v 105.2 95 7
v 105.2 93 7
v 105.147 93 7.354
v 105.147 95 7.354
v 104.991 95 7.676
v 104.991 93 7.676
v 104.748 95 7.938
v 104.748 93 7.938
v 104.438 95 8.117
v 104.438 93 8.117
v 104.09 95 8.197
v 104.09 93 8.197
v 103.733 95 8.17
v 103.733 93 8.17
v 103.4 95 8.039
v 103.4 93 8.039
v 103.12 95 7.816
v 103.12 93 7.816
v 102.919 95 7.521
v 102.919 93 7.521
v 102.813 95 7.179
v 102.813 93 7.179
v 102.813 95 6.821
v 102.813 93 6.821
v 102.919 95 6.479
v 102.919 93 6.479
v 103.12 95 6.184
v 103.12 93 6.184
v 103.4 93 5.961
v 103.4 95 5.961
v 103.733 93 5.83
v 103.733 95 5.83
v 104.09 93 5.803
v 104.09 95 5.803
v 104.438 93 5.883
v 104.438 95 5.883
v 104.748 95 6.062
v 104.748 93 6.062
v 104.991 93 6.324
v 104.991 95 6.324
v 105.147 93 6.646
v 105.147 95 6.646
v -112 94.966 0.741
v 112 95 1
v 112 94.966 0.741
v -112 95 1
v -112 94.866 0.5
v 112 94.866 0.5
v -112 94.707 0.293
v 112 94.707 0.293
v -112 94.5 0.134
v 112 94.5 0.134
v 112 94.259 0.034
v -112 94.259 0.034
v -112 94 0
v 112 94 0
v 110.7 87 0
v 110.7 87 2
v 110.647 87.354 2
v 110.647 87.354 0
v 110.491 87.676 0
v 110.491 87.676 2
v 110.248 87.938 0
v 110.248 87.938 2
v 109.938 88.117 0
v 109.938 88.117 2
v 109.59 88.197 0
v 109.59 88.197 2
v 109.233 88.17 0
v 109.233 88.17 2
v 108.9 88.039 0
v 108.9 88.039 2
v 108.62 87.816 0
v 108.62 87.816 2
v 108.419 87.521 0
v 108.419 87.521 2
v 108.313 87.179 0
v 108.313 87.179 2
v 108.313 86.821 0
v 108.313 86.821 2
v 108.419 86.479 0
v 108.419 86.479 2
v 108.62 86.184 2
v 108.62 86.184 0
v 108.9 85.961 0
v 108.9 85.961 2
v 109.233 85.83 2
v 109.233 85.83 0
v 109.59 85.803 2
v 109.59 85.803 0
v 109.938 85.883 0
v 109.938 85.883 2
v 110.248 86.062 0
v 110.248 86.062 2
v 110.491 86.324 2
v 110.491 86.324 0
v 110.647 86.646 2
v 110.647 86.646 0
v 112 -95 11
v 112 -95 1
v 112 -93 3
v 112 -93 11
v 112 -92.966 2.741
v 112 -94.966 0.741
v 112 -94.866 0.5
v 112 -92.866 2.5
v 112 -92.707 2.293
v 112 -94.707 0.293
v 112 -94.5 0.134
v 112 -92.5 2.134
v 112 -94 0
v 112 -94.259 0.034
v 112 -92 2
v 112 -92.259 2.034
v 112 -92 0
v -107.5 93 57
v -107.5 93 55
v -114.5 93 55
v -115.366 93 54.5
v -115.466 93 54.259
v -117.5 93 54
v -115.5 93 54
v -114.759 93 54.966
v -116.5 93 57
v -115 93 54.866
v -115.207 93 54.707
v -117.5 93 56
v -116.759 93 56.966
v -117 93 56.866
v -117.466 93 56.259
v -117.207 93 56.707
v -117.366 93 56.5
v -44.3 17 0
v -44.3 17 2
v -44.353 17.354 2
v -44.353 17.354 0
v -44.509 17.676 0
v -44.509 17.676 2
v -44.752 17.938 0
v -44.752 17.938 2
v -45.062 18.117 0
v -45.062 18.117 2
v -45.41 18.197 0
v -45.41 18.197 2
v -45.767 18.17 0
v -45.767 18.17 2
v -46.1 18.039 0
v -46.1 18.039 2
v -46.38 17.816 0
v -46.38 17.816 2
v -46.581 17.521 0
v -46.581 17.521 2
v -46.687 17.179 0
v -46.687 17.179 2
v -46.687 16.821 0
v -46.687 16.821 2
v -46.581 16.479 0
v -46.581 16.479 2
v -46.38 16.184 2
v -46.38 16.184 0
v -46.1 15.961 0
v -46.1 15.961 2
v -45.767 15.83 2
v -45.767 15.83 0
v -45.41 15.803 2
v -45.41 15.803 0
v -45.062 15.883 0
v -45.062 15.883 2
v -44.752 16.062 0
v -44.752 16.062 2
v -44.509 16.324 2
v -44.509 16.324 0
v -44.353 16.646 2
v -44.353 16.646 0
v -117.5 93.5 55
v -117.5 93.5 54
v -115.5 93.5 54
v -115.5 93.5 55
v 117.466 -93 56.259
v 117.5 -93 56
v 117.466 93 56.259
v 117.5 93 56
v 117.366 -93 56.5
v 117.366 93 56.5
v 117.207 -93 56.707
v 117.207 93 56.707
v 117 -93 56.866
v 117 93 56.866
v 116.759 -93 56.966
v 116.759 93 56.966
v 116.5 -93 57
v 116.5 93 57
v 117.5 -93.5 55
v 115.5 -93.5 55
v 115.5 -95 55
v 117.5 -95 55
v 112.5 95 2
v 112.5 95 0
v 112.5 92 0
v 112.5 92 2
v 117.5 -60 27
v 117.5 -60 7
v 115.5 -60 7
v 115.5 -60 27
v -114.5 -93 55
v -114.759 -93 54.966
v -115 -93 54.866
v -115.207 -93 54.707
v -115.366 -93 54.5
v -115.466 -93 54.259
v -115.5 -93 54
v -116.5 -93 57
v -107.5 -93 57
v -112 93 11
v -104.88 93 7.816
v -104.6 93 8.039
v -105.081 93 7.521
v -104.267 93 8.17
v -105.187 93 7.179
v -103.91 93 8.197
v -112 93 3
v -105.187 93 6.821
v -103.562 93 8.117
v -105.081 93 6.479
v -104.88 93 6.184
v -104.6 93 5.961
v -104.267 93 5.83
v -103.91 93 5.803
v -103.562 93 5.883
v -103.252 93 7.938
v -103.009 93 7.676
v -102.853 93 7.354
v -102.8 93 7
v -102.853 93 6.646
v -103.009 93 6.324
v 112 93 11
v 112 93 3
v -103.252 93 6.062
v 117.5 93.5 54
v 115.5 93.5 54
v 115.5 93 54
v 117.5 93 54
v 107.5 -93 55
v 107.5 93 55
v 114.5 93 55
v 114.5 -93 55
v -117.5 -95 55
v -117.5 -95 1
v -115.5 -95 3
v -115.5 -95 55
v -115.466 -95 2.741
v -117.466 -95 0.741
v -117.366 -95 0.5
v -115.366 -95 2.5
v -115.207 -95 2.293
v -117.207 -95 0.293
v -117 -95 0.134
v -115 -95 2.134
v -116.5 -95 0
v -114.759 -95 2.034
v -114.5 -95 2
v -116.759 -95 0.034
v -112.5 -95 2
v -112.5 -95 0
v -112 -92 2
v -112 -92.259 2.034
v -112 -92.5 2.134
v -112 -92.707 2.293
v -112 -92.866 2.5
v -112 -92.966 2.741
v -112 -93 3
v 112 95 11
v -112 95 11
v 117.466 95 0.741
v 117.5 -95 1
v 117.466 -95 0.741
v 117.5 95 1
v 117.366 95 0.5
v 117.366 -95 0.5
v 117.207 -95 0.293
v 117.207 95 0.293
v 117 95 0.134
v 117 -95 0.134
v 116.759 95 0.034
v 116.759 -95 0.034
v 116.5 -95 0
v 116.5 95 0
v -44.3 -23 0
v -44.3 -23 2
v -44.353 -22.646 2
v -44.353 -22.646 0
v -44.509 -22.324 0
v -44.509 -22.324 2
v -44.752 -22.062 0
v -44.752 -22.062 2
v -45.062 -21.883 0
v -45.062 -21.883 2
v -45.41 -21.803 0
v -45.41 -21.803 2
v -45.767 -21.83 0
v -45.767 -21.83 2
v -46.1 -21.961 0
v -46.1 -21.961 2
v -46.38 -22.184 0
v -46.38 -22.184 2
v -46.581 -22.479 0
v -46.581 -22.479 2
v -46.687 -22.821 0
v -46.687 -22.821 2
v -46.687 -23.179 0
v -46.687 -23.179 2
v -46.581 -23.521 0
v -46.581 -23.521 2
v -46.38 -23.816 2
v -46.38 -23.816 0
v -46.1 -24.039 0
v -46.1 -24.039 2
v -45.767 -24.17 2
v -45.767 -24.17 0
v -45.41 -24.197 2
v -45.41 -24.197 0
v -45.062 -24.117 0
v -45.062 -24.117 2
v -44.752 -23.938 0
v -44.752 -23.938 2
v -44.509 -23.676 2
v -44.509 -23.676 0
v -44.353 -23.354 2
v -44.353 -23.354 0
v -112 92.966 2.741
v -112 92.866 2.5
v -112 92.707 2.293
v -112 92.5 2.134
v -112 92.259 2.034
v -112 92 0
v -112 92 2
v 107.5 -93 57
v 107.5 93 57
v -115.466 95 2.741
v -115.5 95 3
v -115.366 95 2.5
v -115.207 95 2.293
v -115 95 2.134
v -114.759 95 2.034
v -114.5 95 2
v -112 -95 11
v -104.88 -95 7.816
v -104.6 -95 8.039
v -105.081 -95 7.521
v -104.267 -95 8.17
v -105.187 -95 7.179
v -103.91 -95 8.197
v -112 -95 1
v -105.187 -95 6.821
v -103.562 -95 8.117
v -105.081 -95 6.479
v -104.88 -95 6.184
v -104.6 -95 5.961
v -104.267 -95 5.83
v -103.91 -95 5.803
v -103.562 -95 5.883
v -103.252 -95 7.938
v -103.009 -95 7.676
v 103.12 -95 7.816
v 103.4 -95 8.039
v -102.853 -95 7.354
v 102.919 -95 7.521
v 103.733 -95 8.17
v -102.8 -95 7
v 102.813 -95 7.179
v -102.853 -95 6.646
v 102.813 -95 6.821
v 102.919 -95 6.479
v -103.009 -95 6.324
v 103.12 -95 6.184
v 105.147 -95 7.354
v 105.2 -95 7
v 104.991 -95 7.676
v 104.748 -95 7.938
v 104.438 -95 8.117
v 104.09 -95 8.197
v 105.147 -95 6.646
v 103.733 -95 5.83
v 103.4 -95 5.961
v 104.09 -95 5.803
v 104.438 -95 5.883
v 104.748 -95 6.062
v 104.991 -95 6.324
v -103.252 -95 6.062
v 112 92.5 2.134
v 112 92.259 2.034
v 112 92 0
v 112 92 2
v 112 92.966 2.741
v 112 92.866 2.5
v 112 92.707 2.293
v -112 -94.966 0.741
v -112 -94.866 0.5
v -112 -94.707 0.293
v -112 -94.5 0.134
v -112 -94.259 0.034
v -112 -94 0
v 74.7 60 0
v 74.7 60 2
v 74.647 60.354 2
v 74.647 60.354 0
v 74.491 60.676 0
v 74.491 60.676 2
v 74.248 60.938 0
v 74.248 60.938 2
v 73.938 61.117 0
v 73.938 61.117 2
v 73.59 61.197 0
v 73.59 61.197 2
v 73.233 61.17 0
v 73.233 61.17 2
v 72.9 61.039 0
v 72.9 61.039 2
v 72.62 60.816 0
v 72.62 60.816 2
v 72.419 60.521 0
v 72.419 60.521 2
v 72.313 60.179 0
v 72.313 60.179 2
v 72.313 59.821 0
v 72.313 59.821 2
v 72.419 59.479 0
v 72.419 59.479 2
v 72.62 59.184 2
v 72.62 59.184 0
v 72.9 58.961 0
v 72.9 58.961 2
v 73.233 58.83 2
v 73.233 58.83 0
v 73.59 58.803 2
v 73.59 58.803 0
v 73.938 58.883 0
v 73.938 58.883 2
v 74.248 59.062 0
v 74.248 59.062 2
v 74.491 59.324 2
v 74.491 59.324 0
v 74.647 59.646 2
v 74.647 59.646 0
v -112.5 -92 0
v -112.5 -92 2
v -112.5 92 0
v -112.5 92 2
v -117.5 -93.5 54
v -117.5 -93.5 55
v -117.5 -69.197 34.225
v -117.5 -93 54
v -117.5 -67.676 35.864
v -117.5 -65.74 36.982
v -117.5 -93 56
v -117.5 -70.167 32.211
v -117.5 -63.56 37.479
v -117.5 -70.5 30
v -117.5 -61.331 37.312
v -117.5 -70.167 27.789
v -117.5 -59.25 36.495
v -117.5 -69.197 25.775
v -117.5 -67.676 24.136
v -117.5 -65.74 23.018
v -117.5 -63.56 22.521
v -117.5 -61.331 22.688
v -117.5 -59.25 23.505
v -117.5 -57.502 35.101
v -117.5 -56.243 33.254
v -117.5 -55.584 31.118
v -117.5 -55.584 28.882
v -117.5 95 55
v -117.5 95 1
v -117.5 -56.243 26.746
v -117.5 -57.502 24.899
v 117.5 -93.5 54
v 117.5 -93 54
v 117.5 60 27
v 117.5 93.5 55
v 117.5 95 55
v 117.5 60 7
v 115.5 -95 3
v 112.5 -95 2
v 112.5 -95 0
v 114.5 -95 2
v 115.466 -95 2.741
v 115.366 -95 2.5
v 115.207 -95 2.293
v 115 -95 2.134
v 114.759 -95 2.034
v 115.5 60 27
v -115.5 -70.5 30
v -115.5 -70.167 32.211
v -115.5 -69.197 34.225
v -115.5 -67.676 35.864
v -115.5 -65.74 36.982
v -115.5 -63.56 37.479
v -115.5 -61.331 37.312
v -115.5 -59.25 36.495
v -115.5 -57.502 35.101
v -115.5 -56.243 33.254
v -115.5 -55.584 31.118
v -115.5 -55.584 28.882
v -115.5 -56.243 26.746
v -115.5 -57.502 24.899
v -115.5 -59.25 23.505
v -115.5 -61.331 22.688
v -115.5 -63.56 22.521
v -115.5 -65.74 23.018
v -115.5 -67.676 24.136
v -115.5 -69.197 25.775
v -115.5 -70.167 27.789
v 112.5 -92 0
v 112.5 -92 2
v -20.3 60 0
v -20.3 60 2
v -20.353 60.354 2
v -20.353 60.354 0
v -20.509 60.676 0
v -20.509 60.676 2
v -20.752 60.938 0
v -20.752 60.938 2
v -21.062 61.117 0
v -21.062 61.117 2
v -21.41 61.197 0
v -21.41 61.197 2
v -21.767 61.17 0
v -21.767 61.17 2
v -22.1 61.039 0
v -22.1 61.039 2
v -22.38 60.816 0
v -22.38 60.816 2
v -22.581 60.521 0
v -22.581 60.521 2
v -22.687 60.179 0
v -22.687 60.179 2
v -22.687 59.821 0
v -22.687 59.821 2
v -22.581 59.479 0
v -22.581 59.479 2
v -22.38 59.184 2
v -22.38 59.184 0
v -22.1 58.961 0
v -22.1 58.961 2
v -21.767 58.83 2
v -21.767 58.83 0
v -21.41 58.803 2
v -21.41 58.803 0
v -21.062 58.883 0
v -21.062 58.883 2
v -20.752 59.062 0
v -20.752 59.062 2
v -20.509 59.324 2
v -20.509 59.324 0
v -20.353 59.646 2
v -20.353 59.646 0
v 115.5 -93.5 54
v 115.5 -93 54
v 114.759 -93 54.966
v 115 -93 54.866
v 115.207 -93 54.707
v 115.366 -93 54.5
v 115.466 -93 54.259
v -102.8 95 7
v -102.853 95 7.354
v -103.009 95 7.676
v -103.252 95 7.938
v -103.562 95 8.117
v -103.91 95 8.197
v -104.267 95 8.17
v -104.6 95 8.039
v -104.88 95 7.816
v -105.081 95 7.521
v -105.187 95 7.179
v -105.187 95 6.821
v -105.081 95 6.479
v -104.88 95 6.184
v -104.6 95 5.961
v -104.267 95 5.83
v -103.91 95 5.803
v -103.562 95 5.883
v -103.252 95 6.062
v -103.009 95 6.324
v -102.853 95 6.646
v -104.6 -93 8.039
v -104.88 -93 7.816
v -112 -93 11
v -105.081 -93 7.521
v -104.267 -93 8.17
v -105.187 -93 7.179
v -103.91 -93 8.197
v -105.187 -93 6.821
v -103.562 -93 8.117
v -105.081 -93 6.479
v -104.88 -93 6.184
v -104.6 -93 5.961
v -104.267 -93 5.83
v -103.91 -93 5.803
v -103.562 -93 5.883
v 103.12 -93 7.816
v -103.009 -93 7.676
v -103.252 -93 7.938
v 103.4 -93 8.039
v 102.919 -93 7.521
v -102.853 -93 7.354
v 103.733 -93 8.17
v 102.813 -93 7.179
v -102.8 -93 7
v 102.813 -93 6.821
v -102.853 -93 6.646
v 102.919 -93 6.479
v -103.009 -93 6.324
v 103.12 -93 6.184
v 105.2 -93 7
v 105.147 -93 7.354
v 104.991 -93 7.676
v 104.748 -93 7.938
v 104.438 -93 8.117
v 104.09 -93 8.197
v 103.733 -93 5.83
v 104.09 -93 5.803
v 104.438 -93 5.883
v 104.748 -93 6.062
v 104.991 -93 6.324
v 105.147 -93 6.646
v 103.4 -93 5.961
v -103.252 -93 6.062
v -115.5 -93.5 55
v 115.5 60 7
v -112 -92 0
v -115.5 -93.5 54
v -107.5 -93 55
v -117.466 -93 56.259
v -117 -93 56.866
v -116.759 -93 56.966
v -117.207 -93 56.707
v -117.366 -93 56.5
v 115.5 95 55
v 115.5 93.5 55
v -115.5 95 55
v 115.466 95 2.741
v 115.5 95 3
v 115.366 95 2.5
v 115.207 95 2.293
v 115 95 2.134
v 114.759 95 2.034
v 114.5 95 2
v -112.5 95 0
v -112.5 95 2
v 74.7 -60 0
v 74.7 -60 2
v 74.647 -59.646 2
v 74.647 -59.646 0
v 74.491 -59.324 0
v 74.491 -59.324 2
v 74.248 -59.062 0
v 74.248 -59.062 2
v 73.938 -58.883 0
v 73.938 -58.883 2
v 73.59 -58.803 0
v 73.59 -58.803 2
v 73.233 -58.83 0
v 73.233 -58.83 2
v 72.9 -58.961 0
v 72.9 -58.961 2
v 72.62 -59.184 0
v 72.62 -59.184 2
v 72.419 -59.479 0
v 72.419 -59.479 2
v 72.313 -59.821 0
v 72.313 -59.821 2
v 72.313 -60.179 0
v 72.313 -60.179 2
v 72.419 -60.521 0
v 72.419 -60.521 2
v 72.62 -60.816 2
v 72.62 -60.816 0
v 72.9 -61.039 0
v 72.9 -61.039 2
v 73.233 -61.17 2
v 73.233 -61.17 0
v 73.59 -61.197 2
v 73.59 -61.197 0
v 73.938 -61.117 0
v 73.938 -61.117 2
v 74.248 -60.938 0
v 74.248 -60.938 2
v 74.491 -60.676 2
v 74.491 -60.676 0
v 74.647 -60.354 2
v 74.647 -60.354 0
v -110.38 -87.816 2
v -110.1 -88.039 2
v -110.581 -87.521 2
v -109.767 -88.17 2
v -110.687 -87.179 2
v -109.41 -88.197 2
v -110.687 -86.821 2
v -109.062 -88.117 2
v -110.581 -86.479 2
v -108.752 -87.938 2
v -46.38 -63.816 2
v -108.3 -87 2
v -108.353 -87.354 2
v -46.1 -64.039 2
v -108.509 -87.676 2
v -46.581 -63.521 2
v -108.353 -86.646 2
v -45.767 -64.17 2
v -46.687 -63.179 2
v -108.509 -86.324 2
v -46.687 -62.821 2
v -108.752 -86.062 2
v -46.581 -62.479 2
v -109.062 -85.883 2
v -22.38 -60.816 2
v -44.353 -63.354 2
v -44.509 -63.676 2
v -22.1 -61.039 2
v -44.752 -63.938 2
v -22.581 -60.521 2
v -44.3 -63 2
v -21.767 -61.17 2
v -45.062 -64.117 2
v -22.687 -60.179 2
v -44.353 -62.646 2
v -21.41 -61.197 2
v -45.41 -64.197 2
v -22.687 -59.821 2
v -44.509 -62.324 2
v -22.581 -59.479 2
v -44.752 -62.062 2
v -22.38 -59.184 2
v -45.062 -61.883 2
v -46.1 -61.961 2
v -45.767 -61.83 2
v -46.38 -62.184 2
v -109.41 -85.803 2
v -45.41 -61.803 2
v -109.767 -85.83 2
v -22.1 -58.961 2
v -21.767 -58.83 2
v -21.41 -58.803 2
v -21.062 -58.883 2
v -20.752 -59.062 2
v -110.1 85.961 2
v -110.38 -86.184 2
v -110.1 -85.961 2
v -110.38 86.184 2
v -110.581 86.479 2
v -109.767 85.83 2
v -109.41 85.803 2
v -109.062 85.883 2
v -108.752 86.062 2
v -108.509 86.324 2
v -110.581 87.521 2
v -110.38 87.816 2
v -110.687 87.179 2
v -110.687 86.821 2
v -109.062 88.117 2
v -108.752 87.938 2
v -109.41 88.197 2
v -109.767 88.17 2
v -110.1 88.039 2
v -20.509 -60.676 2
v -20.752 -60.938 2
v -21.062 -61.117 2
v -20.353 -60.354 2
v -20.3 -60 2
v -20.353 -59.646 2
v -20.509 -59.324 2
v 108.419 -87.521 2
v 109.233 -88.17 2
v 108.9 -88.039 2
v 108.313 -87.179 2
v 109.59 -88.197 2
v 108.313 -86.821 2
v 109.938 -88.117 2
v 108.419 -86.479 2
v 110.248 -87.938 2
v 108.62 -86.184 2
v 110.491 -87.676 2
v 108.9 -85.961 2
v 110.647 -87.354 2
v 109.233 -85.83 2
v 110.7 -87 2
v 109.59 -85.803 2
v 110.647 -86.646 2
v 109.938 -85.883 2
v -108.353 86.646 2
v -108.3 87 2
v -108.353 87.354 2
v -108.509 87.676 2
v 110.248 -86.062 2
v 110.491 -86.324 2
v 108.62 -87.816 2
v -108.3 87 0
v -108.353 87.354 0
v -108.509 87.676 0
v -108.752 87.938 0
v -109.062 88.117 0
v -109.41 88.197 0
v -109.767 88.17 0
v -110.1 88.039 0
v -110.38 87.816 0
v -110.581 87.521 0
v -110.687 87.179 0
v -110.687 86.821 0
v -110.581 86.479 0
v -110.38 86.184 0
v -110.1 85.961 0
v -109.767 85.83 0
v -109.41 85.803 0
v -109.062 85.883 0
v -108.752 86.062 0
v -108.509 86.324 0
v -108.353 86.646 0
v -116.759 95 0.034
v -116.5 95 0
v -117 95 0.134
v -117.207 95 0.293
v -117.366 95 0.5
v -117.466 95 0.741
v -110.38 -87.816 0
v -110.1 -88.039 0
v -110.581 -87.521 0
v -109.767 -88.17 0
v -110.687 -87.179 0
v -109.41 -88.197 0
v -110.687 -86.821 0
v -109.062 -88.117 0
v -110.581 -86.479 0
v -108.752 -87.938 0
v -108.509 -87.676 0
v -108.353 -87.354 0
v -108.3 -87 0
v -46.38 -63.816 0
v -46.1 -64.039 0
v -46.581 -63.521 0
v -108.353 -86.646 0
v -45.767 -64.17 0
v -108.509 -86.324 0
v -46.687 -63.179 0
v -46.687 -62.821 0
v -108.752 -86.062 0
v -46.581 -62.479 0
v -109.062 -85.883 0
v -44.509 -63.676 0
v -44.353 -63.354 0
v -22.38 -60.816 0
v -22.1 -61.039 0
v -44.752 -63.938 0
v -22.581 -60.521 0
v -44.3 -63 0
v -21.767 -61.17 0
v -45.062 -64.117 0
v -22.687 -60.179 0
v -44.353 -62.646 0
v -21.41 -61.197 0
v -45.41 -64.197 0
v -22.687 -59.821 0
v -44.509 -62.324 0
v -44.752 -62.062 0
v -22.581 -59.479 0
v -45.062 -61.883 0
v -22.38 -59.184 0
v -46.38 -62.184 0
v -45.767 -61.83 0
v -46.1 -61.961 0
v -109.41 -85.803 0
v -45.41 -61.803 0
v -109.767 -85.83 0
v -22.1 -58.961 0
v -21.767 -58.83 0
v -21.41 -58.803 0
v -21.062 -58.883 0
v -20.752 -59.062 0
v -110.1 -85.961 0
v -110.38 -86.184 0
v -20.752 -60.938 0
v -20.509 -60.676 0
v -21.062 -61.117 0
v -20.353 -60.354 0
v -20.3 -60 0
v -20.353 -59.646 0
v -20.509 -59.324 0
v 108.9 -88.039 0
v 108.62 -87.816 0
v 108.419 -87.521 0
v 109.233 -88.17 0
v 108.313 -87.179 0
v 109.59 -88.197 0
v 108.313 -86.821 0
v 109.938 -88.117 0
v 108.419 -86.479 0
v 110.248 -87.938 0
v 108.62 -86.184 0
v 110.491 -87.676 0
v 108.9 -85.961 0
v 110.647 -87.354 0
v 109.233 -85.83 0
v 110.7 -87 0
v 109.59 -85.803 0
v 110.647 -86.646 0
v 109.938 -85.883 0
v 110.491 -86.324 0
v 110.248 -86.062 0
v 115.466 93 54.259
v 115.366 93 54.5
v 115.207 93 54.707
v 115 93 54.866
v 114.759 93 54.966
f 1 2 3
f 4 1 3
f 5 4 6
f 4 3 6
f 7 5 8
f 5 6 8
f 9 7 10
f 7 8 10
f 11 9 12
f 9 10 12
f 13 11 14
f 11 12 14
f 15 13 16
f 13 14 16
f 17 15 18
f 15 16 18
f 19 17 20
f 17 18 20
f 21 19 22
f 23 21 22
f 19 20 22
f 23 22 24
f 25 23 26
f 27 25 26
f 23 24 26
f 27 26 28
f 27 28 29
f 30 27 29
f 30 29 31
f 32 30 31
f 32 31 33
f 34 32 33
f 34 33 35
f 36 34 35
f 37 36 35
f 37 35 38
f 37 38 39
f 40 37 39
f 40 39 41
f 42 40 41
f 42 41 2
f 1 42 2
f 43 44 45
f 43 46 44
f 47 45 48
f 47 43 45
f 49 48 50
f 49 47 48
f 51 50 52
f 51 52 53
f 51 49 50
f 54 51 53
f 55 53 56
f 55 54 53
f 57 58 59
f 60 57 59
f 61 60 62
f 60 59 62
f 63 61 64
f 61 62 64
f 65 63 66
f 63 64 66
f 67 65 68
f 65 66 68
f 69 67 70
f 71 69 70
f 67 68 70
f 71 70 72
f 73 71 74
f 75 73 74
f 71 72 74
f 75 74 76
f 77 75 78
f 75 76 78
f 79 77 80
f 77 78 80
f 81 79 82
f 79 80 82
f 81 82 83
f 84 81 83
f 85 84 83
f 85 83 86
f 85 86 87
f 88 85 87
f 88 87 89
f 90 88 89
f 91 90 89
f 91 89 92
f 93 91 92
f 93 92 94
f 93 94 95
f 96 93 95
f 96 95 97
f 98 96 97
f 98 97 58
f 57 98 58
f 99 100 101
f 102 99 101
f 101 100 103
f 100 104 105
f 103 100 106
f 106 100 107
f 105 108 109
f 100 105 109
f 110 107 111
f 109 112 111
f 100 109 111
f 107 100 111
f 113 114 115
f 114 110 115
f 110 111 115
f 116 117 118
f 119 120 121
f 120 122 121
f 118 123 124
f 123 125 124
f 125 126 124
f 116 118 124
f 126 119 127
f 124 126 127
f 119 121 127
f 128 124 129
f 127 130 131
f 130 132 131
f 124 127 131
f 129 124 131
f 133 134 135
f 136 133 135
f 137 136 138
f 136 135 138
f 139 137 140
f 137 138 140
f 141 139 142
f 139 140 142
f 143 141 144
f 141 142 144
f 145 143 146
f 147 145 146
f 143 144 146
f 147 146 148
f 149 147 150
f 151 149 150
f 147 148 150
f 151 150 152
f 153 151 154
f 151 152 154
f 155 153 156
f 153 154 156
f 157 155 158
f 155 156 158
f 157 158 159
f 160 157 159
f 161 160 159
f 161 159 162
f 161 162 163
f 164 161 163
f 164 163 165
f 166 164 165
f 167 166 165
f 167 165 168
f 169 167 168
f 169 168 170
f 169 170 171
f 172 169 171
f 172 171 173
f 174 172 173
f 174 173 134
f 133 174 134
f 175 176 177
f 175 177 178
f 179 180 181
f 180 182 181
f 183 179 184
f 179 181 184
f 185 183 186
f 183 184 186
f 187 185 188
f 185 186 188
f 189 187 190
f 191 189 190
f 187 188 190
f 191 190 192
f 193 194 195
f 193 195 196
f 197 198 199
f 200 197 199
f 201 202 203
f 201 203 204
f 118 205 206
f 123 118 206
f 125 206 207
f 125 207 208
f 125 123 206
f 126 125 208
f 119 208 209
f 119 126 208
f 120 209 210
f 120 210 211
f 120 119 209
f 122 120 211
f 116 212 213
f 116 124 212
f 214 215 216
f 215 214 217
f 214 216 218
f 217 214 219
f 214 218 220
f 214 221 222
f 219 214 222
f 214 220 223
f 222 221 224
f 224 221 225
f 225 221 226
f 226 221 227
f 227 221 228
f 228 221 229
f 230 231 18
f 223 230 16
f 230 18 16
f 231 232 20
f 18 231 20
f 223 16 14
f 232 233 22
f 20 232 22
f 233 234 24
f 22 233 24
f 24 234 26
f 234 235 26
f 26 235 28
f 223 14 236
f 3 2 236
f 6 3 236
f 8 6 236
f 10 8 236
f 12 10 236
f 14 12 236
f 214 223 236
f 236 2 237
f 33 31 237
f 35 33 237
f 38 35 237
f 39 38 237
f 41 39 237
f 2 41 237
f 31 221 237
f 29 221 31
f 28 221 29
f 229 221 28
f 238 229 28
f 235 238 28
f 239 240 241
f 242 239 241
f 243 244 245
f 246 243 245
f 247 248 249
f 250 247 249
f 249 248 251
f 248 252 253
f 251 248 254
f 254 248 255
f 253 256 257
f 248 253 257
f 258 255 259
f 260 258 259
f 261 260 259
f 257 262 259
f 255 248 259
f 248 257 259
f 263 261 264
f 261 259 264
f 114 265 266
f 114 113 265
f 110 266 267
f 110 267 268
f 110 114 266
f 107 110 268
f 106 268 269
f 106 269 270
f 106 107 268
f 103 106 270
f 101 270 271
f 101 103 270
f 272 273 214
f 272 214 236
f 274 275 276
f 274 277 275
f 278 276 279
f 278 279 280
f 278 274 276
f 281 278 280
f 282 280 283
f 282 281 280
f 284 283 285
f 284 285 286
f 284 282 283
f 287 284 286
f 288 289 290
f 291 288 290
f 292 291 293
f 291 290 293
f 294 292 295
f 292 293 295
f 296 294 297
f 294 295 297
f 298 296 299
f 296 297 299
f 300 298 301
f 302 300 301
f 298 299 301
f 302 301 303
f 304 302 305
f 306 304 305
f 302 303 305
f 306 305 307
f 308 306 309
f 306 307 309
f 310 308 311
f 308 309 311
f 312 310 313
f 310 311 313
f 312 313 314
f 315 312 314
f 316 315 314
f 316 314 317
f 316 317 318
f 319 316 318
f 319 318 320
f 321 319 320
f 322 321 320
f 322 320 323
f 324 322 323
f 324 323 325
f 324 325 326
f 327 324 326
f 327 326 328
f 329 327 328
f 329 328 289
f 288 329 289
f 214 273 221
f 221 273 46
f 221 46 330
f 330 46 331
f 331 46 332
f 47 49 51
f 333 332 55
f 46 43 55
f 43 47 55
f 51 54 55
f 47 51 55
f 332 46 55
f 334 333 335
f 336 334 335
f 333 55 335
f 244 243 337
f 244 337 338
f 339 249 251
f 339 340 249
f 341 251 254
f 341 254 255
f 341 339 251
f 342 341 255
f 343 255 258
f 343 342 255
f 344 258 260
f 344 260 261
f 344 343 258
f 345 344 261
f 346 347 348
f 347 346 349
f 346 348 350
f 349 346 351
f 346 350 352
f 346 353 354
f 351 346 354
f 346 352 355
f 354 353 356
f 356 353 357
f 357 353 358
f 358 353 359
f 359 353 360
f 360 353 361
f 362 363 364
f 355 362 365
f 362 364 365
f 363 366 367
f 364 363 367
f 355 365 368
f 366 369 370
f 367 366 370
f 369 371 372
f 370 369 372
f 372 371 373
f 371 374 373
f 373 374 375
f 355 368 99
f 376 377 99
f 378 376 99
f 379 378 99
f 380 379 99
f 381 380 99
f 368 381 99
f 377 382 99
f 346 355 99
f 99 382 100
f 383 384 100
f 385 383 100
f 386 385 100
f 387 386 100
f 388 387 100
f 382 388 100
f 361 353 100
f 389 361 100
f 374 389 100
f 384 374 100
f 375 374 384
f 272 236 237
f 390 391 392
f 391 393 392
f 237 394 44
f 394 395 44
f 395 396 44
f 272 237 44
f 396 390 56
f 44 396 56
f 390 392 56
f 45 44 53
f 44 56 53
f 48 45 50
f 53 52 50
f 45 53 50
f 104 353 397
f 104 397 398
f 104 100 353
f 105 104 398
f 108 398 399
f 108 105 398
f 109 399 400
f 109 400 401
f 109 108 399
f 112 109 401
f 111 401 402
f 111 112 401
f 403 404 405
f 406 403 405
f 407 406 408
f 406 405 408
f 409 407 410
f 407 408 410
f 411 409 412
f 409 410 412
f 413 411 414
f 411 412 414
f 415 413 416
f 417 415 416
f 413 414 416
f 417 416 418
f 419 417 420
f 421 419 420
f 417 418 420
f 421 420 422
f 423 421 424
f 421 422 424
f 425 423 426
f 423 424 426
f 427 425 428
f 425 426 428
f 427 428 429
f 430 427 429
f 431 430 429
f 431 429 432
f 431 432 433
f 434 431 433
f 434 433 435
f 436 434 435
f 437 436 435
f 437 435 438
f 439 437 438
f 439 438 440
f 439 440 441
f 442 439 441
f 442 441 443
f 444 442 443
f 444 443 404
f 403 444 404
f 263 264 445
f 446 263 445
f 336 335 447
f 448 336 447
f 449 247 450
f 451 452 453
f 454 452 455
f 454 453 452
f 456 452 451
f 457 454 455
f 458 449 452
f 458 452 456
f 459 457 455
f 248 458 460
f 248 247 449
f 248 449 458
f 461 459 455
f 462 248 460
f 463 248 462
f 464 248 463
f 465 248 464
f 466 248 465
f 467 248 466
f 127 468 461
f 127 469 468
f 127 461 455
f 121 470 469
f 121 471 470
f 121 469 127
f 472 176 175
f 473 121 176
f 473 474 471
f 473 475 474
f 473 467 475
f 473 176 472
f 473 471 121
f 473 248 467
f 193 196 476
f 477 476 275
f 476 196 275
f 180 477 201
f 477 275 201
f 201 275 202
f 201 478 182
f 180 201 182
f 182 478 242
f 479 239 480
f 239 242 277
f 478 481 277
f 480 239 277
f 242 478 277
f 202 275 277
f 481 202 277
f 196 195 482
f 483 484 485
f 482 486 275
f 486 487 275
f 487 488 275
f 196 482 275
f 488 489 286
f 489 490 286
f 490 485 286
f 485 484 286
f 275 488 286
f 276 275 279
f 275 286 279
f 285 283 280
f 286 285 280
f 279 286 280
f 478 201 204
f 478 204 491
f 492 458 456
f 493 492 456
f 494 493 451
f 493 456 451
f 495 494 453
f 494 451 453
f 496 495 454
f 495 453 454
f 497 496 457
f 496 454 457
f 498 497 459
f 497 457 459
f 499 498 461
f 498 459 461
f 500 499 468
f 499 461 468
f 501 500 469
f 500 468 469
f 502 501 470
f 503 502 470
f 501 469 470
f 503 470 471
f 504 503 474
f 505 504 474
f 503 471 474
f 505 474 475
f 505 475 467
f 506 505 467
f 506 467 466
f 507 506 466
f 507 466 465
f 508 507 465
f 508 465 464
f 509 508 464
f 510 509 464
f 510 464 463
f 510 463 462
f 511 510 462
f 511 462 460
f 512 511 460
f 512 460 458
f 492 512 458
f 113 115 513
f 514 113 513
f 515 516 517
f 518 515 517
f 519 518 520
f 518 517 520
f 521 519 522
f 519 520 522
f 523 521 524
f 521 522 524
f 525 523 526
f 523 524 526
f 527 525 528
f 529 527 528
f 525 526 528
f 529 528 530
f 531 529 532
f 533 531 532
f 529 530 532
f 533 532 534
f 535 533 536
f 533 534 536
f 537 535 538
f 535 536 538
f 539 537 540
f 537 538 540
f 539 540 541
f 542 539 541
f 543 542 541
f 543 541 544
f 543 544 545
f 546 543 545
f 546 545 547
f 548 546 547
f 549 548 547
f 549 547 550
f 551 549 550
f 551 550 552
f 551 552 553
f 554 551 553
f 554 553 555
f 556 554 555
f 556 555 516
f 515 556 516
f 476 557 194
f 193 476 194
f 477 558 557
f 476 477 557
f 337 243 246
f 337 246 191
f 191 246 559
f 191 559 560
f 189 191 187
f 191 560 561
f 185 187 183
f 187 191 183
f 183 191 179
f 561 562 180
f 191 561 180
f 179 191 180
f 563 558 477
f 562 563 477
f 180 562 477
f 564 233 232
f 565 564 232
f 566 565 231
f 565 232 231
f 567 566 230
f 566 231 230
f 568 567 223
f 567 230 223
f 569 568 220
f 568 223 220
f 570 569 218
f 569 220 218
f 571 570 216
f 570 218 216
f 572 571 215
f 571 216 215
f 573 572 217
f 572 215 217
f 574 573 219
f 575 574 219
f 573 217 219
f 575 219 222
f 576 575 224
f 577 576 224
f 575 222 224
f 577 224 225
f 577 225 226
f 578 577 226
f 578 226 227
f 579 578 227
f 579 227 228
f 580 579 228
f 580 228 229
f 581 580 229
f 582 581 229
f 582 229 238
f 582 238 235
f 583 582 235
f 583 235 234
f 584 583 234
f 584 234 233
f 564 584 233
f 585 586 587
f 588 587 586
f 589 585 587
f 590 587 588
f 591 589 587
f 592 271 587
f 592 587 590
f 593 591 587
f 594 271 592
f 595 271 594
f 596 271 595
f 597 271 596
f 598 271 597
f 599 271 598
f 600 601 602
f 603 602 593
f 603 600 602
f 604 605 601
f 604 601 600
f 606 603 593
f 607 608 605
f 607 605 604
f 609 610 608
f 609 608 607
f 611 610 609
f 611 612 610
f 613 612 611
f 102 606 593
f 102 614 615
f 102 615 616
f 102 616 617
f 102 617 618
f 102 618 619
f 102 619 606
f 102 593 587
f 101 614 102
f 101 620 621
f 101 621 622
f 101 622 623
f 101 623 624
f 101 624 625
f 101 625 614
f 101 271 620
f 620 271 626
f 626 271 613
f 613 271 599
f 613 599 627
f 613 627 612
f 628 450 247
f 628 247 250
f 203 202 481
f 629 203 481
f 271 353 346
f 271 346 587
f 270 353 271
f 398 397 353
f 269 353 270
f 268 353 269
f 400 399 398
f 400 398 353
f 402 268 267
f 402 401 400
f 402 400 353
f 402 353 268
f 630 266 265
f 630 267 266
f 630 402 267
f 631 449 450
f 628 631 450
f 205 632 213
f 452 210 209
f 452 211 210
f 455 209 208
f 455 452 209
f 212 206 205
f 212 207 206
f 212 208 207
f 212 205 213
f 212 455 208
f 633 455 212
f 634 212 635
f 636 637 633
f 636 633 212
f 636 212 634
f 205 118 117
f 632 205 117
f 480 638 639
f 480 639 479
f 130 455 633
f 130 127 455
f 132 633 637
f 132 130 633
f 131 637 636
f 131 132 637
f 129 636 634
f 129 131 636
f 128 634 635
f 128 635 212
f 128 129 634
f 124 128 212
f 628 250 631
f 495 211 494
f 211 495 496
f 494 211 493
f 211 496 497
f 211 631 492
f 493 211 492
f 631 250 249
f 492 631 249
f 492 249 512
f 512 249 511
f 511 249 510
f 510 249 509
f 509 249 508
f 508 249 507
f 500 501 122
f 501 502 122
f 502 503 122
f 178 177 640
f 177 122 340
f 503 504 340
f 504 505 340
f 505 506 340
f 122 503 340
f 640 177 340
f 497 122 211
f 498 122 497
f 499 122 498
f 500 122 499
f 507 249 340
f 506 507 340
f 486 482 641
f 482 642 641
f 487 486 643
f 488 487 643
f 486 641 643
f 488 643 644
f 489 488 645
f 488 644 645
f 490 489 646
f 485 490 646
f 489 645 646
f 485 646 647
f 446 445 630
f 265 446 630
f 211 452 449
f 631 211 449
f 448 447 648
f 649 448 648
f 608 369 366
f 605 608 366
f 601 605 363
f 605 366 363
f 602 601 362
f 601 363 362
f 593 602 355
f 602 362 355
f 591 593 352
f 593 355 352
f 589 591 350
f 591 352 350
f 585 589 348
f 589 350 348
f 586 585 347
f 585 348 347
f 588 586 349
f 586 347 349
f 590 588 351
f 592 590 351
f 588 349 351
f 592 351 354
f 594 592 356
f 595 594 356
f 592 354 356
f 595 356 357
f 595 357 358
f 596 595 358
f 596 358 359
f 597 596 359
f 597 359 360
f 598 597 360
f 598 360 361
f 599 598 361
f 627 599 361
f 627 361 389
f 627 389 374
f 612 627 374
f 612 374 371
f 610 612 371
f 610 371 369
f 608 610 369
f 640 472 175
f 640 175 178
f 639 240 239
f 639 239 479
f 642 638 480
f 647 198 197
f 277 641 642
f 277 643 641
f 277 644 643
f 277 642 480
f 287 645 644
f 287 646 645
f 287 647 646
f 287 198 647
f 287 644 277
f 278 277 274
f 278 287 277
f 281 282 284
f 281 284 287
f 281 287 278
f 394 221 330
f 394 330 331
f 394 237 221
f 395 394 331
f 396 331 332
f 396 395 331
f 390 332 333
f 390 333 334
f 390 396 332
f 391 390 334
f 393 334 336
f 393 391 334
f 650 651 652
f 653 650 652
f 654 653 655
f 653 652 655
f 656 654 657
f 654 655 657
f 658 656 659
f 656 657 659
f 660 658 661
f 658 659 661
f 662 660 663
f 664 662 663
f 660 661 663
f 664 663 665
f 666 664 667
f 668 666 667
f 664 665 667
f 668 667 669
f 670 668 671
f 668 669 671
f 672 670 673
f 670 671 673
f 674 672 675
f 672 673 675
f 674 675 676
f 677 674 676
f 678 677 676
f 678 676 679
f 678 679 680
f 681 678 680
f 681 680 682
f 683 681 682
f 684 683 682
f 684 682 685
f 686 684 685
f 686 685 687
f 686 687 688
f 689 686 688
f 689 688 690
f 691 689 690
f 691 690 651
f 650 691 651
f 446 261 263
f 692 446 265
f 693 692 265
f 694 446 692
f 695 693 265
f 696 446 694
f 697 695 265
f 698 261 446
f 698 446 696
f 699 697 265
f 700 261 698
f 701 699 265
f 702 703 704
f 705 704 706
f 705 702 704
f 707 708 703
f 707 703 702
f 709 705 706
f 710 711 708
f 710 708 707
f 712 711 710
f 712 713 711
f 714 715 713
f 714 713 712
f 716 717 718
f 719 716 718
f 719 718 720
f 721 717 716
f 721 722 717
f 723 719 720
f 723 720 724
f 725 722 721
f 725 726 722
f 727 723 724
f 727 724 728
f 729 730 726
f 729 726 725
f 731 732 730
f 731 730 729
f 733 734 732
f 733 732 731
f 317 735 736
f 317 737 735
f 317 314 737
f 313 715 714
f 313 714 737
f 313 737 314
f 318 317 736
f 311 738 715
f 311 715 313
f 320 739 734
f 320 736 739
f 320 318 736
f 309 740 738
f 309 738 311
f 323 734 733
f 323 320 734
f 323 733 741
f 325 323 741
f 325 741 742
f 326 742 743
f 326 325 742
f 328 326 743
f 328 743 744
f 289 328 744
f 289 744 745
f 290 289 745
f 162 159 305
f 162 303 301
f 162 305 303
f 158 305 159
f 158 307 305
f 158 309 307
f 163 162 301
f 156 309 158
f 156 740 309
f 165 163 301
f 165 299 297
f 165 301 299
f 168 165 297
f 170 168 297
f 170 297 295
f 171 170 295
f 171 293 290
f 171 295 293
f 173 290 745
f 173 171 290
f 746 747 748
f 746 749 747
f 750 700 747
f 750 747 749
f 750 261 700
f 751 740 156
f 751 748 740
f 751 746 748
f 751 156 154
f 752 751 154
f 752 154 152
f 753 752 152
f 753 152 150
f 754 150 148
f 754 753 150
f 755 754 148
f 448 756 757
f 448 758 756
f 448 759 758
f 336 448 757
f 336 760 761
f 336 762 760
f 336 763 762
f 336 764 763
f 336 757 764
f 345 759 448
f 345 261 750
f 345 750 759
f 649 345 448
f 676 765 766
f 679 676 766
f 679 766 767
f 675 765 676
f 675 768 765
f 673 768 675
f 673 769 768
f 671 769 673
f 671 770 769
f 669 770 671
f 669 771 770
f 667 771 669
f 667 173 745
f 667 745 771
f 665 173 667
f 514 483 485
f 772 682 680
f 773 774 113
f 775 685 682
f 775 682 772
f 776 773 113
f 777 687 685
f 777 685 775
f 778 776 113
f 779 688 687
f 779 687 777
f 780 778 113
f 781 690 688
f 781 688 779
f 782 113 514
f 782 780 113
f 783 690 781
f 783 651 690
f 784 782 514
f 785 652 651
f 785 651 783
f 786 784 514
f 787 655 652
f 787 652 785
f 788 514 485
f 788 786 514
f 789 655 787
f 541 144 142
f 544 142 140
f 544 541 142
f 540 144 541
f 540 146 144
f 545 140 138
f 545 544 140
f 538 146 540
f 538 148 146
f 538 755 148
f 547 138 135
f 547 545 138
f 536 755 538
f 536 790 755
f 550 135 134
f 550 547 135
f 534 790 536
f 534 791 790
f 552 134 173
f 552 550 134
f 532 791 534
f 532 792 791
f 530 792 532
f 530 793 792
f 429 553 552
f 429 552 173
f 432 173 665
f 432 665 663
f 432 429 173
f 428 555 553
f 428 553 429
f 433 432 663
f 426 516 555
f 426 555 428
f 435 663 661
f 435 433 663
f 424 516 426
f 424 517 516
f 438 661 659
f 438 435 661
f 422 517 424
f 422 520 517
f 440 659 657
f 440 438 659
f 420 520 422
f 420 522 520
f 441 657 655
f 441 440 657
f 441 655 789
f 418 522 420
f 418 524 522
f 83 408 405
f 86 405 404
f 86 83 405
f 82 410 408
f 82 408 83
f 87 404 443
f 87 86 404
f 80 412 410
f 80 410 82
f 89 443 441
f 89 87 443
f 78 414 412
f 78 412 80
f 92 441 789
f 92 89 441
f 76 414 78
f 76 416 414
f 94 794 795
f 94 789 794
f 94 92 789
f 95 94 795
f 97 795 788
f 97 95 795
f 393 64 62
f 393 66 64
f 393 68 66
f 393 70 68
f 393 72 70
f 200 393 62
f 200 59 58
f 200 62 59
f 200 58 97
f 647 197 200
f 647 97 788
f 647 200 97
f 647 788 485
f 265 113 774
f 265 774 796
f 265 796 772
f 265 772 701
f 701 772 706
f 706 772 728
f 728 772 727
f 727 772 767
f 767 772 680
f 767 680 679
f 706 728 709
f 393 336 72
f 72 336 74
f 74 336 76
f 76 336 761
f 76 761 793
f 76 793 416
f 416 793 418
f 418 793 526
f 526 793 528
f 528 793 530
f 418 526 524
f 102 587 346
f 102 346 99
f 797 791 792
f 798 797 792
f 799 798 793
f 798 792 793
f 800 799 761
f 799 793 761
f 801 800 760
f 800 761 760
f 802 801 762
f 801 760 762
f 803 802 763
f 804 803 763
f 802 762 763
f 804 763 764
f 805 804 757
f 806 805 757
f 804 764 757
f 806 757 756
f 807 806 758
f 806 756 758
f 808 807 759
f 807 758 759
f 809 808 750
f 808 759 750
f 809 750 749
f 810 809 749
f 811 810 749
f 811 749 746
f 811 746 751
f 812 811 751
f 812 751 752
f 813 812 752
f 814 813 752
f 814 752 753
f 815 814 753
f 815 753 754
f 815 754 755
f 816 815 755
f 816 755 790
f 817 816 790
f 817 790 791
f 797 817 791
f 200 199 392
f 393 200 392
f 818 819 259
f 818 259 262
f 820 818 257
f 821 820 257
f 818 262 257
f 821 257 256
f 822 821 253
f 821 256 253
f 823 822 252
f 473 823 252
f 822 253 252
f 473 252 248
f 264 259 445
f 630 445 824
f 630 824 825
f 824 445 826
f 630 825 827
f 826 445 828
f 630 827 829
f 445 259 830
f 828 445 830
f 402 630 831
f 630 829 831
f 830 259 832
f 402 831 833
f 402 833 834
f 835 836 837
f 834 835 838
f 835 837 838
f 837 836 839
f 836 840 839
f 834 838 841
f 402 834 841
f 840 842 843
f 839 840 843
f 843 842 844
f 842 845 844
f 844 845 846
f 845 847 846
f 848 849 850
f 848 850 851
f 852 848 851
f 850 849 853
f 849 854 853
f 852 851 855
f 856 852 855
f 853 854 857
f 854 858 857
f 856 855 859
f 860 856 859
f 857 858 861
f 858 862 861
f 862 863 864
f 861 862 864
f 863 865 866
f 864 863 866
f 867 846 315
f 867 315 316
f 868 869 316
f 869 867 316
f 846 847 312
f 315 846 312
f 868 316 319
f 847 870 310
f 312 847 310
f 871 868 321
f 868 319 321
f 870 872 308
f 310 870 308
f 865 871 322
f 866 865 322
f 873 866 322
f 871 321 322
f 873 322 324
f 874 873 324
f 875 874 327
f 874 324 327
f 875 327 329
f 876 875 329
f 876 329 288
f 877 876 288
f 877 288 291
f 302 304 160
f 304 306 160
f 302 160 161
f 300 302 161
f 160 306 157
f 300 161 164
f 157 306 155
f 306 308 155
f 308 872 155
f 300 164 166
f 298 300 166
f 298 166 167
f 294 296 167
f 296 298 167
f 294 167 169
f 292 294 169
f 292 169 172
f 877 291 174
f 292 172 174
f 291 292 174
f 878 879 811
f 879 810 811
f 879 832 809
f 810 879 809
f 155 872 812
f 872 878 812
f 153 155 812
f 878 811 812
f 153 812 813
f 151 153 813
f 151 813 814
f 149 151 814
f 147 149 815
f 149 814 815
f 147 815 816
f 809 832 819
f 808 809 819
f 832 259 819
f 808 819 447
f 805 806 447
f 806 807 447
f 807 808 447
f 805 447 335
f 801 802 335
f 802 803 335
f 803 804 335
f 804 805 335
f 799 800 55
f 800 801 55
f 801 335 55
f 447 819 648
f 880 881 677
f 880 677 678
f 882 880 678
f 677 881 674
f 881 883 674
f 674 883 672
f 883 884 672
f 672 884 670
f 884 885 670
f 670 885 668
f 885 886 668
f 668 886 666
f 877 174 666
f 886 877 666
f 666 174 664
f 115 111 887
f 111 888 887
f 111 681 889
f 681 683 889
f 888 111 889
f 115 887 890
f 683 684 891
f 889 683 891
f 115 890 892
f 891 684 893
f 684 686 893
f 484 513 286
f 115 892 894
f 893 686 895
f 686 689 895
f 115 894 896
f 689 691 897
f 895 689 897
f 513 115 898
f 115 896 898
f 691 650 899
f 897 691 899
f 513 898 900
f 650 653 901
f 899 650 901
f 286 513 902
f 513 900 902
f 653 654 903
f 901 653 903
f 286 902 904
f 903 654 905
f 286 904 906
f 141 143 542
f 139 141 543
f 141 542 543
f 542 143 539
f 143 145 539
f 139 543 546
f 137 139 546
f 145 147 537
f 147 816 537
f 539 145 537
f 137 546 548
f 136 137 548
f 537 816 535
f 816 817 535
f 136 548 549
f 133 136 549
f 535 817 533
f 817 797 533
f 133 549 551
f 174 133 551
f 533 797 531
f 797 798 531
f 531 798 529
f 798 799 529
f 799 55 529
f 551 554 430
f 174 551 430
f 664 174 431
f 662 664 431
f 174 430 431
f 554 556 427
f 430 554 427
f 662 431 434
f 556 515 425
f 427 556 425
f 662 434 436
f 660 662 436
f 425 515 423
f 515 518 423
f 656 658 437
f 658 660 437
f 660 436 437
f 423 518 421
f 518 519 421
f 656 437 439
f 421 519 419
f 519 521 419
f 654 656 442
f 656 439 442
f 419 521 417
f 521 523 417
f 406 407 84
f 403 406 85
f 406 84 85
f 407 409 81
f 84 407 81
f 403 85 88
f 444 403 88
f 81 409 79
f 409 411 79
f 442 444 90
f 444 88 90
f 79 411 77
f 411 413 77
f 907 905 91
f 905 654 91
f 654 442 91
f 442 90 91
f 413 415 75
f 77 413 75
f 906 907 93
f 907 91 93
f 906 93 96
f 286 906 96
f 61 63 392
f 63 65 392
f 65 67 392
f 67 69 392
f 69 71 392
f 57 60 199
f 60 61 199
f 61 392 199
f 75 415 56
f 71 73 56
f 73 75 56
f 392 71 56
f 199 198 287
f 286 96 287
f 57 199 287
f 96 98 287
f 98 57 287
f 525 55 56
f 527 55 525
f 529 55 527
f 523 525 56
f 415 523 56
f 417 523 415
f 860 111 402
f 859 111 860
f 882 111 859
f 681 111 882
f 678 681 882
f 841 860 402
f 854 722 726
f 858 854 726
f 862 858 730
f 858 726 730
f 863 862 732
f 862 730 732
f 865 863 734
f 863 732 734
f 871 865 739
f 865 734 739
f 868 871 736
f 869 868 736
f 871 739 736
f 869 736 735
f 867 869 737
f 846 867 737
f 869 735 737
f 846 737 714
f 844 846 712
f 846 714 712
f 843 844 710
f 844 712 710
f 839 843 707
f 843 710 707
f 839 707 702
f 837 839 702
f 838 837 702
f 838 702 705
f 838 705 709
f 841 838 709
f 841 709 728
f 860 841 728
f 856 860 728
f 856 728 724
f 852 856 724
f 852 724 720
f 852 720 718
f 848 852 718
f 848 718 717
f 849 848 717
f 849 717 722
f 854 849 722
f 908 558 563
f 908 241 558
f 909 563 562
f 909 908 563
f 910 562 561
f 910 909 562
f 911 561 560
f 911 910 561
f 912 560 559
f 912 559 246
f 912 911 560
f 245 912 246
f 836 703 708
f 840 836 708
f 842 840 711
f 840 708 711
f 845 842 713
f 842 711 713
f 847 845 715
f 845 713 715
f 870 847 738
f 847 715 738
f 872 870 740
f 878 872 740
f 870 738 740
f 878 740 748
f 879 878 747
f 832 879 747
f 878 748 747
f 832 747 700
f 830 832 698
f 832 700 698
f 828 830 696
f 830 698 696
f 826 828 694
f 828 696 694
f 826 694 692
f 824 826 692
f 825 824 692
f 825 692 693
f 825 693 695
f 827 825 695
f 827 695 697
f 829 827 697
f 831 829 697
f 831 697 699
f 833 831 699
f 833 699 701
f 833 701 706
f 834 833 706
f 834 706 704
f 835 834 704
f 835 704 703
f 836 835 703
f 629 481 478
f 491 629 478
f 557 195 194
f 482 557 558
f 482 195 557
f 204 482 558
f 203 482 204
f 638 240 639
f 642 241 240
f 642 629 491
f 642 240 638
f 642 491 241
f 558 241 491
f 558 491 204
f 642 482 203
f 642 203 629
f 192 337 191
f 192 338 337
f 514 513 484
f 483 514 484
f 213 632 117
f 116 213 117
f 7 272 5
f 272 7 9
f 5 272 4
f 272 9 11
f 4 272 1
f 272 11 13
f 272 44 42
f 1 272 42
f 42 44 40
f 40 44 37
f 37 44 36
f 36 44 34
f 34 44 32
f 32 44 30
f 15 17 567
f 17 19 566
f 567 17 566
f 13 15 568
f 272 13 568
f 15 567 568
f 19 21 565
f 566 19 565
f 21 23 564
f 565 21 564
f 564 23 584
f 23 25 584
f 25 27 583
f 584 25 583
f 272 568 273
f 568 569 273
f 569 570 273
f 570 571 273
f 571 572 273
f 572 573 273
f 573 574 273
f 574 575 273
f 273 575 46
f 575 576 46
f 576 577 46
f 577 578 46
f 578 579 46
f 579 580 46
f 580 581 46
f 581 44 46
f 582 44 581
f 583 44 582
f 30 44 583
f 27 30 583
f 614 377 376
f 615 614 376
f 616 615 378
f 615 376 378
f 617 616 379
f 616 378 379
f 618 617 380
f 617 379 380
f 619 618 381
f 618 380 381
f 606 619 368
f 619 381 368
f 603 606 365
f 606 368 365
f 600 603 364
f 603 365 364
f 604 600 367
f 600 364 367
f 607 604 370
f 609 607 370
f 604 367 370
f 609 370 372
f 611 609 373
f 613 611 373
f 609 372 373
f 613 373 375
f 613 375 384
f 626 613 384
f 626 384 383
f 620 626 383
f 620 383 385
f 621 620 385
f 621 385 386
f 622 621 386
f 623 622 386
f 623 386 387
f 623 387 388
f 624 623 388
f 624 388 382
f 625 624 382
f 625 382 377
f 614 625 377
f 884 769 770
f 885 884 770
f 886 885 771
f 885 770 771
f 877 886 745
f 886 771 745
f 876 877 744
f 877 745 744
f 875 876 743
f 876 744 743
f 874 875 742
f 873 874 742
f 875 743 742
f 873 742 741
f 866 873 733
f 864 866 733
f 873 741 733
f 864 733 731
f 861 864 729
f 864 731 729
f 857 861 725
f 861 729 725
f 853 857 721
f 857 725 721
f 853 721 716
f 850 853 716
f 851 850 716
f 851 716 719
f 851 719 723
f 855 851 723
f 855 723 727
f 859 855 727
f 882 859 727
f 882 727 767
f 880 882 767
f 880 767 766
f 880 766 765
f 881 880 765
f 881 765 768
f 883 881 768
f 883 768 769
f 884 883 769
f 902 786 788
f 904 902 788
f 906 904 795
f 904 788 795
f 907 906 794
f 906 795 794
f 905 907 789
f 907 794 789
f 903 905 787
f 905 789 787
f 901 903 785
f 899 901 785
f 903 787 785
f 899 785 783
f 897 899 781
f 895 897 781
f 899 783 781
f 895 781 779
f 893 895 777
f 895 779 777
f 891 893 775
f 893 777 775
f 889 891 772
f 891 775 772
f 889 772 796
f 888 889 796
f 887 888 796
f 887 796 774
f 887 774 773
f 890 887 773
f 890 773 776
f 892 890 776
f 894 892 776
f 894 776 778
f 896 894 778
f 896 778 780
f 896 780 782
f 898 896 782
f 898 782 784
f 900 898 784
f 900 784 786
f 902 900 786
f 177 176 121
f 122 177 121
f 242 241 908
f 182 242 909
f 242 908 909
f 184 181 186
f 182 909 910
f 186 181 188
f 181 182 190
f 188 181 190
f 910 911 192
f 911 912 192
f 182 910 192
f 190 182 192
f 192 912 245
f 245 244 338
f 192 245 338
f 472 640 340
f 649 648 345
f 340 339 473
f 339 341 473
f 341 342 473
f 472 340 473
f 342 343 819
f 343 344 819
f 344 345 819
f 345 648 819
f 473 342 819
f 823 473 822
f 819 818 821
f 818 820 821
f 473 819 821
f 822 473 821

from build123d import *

# Parameters (mm, degrees)
F1_DEPTH  = 2
F2_W      = 2
F2_H      = 190
F3_DEPTH  = 53
F4_R      = 1
F5_W      = 10
F5_H      = 186
F6_DEPTH  = 2
F7_R      = 1
F8_W      = 224
F8_H      = 2
F9_DEPTH  = 9
F10_R     = 1
F11_W     = 0.5
F11_H     = 1
F12_DEPTH = 235.001
F13_R     = 7.5
F14_DEPTH = 3
F15_R     = 1.2
F16_DEPTH = 3
F17_R     = 1.2
F18_DEPTH = 190.001
F19_W     = 120
F19_H     = 20
F20_DEPTH = 3


with BuildPart() as f1:
    # F0 (on Top) → F1 (new body)
    with BuildSketch(Plane.XY):
        Polygon((112.5, -95), (117.5, -95), (117.5, 95), (112.5, 95), (112.5, 92), (112, 92), (112, 95), (-112, 95), (-112, 92), (-112.5, 92), (-112.5, 95), (-117.5, 95), (-117.5, -95), (-112.5, -95), (-112.5, -92), (-112, -92), (-112, -95), (112, -95), (112, -92), (112.5, -92), align=None)
    extrude(amount=F1_DEPTH)

    # F2 (on face) → F3 (join)
    with BuildSketch(Plane.XY.offset(2)):
        with Locations((116.5, 0)):
            Rectangle(F2_W, F2_H)
        with Locations((-116.5, 0)):
            Rectangle(F2_W, F2_H)
    extrude(amount=F3_DEPTH)

    # F4
    f4_edges = [f1.edges().sort_by_distance(p)[0] for p in [
        (-117.5, 0, 0),
        (117.5, 0, 0),
        (-115.5, 0, 2),
        (115.5, 0, 2),
    ]]
    fillet(f4_edges, radius=F4_R)

    # F5 (on face) → F6 (join)
    with BuildSketch(Plane.XY.offset(55)):
        with Locations((-112.5, 0)):
            Rectangle(F5_W, F5_H)
        with Locations((112.5, 0)):
            Rectangle(F5_W, F5_H)
    extrude(amount=F6_DEPTH)

    # F7
    f7_edges = [f1.edges().sort_by_distance(p)[0] for p in [
        (-117.5, 0, 57),
        (117.5, 0, 57),
        (-115.5, 0, 55),
        (115.5, 0, 55),
    ]]
    fillet(f7_edges, radius=F7_R)

    # F8 (on face) → F9 (join)
    with BuildSketch(Plane.XY.offset(2)):
        with Locations((0, -94)):
            Rectangle(F8_W, F8_H)
        with Locations((0, 94)):
            Rectangle(F8_W, F8_H)
    extrude(amount=F9_DEPTH)

    # F10
    f10_edges = [f1.edges().sort_by_distance(p)[0] for p in [
        (0, -95, 0),
        (0, -93, 2),
        (0, 93, 2),
        (0, 95, 0),
    ]]
    fillet(f10_edges, radius=F10_R)

    # F11 (on face) → F12 (cut, through all)
    with BuildSketch(Plane(origin=(-117.5, 0, 0), x_dir=(0, -1, 0), z_dir=(-1, 0, 0))):
        with Locations((93.25, 54.5)):
            Rectangle(F11_W, F11_H)
        with Locations((-93.25, 54.5)):
            Rectangle(F11_W, F11_H)
    extrude(amount=-F12_DEPTH, mode=Mode.SUBTRACT)

    # F13 (on face) → F14 (cut)
    with BuildSketch(Plane(origin=(-117.5, 0, 0), x_dir=(0, -1, 0), z_dir=(-1, 0, 0))):
        with Locations((63, 30)):
            Circle(F13_R)
    extrude(amount=-F14_DEPTH, mode=Mode.SUBTRACT)

    # F15 (on face) → F16 (cut)
    with BuildSketch(Plane.XY.offset(2)):
        with Locations((-109.5, 87)):
            Circle(F15_R)
        with Locations((109.5, 87)):
            Circle(F15_R)
        with Locations((-109.5, -87)):
            Circle(F15_R)
        with Locations((109.5, -87)):
            Circle(F15_R)
        with Locations((-21.5, 60)):
            Circle(F15_R)
        with Locations((73.5, 60)):
            Circle(F15_R)
        with Locations((-21.5, -60)):
            Circle(F15_R)
        with Locations((73.5, -60)):
            Circle(F15_R)
        with Locations((-45.5, 17)):
            Circle(F15_R)
        with Locations((-45.5, -23)):
            Circle(F15_R)
        with Locations((-45.5, -63)):
            Circle(F15_R)
    extrude(amount=-F16_DEPTH, mode=Mode.SUBTRACT)

    # F17 (on face) → F18 (cut, through all)
    with BuildSketch(Plane.XZ.offset(95)):
        with Locations((104, 7)):
            Circle(F17_R)
        with Locations((-104, 7)):
            Circle(F17_R)
    extrude(amount=-F18_DEPTH, mode=Mode.SUBTRACT)

    # F19 (on face) → F20 (cut)
    with BuildSketch(Plane.YZ.offset(117.5)):
        with Locations((0, 17)):
            Rectangle(F19_W, F19_H)
    extrude(amount=-F20_DEPTH, mode=Mode.SUBTRACT)


solid = f1.part
